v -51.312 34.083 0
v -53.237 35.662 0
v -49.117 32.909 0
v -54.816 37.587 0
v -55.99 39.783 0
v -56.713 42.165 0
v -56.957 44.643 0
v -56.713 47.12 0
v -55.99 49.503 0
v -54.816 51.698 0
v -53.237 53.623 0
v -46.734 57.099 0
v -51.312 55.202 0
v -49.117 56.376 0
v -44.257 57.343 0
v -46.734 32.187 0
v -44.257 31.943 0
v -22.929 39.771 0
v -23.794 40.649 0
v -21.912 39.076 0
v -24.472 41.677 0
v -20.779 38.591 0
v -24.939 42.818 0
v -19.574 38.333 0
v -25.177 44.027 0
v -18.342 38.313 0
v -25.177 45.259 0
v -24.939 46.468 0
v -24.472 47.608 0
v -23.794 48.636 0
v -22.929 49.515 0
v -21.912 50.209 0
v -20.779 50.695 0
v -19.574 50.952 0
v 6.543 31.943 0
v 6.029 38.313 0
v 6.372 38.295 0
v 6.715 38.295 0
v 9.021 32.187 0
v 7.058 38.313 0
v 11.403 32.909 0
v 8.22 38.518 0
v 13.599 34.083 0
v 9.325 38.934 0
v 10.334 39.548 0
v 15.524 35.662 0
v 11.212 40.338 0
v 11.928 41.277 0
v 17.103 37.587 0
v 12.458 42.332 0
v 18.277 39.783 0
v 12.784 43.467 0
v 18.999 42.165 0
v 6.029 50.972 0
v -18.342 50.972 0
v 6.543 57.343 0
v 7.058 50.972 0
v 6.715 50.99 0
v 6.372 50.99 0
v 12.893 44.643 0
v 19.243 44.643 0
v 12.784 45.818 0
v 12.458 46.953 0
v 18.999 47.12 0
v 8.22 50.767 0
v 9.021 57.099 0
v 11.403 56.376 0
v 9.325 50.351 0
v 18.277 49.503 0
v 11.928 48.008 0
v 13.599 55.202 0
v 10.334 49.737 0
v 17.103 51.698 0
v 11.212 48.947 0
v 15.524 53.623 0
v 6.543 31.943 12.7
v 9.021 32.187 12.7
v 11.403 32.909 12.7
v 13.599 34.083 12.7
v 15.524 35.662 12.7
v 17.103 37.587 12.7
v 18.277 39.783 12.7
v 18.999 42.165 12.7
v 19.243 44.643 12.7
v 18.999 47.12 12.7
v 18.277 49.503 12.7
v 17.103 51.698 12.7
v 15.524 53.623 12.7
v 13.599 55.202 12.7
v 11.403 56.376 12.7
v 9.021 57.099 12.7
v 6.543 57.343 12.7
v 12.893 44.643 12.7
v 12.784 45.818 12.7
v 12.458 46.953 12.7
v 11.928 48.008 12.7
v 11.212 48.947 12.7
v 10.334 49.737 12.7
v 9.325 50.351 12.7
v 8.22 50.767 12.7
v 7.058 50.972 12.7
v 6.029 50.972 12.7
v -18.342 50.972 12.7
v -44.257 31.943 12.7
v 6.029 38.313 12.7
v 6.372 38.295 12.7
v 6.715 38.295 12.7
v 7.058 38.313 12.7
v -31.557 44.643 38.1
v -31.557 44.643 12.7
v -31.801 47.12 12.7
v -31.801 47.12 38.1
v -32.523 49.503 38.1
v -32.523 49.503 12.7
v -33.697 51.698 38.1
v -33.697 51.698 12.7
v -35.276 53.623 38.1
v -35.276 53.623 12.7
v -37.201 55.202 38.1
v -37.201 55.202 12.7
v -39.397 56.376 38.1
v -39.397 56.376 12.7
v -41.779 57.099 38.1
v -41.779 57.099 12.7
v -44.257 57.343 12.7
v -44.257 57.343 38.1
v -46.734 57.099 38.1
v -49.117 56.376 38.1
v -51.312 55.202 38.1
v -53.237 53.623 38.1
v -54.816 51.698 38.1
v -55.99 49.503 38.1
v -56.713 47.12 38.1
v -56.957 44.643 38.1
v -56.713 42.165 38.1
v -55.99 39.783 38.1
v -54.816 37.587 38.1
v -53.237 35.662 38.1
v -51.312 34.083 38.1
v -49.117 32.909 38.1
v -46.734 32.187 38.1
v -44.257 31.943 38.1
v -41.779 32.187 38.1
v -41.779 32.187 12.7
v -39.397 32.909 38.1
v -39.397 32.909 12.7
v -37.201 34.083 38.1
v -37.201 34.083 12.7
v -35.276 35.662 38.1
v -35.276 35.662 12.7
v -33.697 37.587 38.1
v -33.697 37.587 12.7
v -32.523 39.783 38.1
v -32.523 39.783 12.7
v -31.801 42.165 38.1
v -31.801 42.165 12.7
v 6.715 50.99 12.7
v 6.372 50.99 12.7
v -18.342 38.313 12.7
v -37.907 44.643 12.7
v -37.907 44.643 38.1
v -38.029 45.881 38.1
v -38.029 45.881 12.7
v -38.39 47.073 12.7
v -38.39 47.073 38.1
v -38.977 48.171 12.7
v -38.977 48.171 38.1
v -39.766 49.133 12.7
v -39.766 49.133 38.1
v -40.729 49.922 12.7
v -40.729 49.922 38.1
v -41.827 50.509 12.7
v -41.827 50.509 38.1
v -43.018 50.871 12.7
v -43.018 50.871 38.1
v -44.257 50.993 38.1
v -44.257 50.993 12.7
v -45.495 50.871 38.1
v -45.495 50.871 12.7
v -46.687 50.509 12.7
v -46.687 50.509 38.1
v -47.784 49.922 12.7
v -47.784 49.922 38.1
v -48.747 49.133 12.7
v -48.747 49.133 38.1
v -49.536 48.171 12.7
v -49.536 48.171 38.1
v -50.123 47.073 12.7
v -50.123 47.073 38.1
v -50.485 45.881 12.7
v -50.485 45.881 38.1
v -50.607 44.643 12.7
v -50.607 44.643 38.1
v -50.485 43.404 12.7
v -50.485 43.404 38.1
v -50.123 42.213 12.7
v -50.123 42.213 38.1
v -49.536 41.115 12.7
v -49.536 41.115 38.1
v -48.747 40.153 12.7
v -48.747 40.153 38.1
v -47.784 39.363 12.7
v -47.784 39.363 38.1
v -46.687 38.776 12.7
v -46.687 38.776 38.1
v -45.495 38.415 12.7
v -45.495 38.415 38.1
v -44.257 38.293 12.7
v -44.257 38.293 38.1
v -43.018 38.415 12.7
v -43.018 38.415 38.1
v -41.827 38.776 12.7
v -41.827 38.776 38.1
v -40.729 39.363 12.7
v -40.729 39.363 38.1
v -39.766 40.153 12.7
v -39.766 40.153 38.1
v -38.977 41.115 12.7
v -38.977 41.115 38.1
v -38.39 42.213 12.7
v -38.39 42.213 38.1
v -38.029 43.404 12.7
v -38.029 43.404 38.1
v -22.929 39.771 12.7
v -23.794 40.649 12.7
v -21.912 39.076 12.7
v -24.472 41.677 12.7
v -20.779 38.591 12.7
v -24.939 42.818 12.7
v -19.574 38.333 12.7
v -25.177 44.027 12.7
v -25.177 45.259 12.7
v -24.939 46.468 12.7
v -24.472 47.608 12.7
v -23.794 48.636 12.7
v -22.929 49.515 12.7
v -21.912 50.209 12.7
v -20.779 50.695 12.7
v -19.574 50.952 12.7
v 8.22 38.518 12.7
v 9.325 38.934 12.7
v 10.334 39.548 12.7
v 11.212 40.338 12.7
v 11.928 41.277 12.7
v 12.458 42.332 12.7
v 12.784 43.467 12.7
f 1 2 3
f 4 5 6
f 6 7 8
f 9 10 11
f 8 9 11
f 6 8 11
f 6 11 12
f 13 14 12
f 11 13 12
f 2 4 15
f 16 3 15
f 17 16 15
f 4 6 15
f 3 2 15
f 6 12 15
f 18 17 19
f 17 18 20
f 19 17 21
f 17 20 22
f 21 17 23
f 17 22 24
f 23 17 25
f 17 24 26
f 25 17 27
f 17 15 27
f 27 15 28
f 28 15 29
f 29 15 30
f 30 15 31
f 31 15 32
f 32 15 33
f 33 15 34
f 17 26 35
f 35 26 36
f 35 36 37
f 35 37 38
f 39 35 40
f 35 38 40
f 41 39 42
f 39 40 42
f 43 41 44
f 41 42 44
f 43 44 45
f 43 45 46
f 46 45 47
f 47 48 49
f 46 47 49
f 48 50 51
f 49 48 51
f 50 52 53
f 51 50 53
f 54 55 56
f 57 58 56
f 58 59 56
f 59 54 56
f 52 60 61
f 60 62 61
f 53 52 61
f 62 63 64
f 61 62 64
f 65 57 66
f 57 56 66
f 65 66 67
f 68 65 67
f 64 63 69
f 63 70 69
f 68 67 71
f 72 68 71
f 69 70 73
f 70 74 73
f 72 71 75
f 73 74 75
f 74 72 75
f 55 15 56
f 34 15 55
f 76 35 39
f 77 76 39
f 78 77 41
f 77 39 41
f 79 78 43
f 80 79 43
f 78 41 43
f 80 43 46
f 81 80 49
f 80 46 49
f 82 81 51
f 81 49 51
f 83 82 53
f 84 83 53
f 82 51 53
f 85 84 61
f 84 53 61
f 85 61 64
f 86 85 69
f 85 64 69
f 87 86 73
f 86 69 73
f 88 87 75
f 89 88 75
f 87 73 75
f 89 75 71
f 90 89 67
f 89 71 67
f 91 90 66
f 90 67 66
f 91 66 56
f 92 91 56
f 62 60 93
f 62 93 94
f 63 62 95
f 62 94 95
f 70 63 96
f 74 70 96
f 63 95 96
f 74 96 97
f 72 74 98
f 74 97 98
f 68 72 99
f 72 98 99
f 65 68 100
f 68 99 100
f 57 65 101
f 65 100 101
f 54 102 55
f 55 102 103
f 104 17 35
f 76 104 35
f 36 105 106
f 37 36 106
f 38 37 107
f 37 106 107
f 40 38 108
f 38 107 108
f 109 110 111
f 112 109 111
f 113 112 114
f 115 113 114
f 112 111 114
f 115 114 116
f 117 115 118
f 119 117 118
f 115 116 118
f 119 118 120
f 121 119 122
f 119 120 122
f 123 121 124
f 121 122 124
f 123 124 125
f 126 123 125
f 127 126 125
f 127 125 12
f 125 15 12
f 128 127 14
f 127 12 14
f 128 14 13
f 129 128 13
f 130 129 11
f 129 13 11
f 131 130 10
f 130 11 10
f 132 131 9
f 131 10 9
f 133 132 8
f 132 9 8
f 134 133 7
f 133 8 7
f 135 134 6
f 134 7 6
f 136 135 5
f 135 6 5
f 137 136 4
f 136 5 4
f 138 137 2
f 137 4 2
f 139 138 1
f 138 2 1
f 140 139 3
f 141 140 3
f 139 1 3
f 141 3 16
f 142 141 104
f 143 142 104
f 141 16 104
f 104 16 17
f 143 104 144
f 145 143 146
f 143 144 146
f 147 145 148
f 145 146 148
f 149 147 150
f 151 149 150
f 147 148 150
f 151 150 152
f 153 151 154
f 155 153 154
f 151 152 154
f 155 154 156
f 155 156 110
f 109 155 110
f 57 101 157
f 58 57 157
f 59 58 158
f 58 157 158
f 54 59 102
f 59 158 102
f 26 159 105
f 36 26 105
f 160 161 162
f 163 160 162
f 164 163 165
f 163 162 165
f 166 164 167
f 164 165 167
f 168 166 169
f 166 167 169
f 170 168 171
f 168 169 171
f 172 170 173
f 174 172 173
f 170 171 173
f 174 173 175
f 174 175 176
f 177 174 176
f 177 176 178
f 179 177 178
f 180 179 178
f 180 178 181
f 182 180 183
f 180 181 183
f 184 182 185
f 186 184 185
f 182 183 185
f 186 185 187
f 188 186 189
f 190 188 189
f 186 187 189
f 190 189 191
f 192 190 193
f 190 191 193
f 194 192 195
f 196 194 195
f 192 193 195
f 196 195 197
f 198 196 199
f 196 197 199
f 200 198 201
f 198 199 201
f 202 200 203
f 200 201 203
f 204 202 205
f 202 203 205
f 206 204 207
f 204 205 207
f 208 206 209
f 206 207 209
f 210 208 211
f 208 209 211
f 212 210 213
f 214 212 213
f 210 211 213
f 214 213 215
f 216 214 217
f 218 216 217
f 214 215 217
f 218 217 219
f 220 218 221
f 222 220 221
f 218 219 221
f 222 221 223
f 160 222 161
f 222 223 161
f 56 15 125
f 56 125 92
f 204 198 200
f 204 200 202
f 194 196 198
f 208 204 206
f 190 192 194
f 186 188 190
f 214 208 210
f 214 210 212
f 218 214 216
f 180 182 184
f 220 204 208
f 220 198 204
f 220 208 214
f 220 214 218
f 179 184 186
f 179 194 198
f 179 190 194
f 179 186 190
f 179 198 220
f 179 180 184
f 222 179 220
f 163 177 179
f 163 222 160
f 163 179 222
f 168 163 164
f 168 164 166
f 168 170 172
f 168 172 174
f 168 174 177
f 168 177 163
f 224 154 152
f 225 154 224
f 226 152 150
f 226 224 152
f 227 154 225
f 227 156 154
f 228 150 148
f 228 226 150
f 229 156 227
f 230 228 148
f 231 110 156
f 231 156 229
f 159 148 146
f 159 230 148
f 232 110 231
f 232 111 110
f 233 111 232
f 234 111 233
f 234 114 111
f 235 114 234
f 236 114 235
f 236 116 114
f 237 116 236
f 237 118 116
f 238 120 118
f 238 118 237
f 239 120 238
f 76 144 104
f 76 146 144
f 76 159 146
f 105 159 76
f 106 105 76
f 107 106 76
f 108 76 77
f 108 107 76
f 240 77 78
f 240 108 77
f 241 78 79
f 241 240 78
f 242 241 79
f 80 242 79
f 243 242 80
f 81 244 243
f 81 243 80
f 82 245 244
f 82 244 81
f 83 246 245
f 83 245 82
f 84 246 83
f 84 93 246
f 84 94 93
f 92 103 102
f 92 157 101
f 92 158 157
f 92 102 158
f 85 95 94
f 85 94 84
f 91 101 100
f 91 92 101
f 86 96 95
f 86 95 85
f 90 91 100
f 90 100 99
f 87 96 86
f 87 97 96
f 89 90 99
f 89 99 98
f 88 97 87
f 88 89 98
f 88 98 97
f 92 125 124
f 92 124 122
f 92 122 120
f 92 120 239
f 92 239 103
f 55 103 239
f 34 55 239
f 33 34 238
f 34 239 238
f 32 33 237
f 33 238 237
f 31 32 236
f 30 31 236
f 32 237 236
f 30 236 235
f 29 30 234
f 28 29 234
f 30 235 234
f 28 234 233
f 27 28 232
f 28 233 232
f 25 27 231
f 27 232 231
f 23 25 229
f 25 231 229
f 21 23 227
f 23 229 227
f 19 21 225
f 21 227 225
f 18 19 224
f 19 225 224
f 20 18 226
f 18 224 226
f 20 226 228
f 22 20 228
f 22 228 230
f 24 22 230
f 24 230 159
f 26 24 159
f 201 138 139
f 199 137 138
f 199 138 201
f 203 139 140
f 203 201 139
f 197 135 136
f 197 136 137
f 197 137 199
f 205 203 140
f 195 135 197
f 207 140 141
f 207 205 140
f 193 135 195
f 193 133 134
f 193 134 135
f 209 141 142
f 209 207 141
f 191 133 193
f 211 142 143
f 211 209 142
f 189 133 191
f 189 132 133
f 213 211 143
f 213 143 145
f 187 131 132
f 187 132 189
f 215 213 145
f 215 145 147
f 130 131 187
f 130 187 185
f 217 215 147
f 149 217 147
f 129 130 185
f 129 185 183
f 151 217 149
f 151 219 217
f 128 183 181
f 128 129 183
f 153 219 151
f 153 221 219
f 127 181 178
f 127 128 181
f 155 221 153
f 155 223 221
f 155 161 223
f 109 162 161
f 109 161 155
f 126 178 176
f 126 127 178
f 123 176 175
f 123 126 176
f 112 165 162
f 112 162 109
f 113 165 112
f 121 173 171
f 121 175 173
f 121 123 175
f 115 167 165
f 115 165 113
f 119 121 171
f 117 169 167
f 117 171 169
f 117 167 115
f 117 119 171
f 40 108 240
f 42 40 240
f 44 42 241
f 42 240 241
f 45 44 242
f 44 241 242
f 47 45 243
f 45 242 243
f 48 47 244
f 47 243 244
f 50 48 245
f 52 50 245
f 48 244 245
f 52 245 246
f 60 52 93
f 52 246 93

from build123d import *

# Parameters (mm, degrees)
F0_W     = 50.8
F0_H     = 25.4
F1_DEPTH = 12.7
F2_R     = 12.7
F3_DEPTH = 25.4
F4_R     = 6.35
F5_DEPTH = 25.4
F7_DEPTH = 12.7


with BuildPart() as f1:
    # F0 (on Top) → F1 (new body)
    with BuildSketch(Plane.XY):
        with Locations((-18.8566240436, 44.6426421404)):
            Rectangle(F0_W, F0_H)
        with BuildLine():
            Line((-44.2566240436, 31.9426421404), (-44.2566240436, 57.3426421404))
            ThreePointArc((-44.2566240436, 57.3426421404), (-56.9566240436, 44.6426421404), (-44.2566240436, 31.9426421404))
        make_face()
        with BuildLine():
            ThreePointArc((6.5433759564, 31.9426421404), (19.2433759564, 44.6426421404), (6.5433759564, 57.3426421404))
            Line((6.5433759564, 57.3426421404), (6.5433759564, 31.9426421404))
        make_face()
    extrude(amount=F1_DEPTH)

    # F2 (on face) → F3 (join)
    with BuildSketch(Plane.XY.offset(12.7)):
        with Locations((-44.2566240436, 44.6426421404)):
            Circle(F2_R)
    extrude(amount=F3_DEPTH)

    # F4 (on face) → F5 (cut)
    with BuildSketch(Plane.XY.offset(38.1)):
        with Locations((-44.2566240436, 44.6426421404)):
            Circle(F4_R)
    extrude(amount=-F5_DEPTH, mode=Mode.SUBTRACT)

    # F6 (on face) → F7 (cut)
    with BuildSketch(Plane.XY.offset(12.7)):
        with BuildLine():
            ThreePointArc((7.0575587453, 38.3134940097), (11.2117568701, 40.3381422106), (12.8933759564, 44.6426421404))
            ThreePointArc((12.8933759564, 44.6426421404), (11.2117568701, 48.9471420701), (7.0575587453, 50.971790271))
            Line((7.0575587453, 50.971790271), (7.0575587453, 38.3134940097))
        make_face()
        with BuildLine():
            Line((6.0291931675, 50.971790271), (7.0575587453, 50.971790271))
            ThreePointArc((7.0575587453, 50.971790271), (6.5433759564, 50.9926421404), (6.0291931675, 50.971790271))
        make_face()
        with BuildLine():
            Line((7.0575587453, 38.3134940097), (7.0575587453, 50.971790271))
            Line((7.0575587453, 50.971790271), (6.0291931675, 50.971790271))
            ThreePointArc((6.0291931675, 50.971790271), (0.1933759564, 44.6426421404), (6.0291931675, 38.3134940097))
            Line((6.0291931675, 38.3134940097), (7.0575587453, 38.3134940097))
        make_face()
        with BuildLine():
            ThreePointArc((6.0291931675, 38.3134940097), (6.5433759564, 38.2926421404), (7.0575587453, 38.3134940097))
            Line((7.0575587453, 38.3134940097), (6.0291931675, 38.3134940097))
        make_face()
        with BuildLine():
            ThreePointArc((6.0291931675, 38.3134940097), (0.1933759564, 44.6426421404), (6.0291931675, 50.971790271))
            Line((6.0291931675, 50.971790271), (-18.3424412547, 50.971790271))
            ThreePointArc((-18.3424412547, 50.971790271), (-14.1882431299, 48.9471420701), (-12.5066240436, 44.6426421404))
            ThreePointArc((-12.5066240436, 44.6426421404), (-14.1882431299, 40.3381422106), (-18.3424412547, 38.3134940097))
            Line((-18.3424412547, 38.3134940097), (6.0291931675, 38.3134940097))
        make_face()
        with BuildLine():
            Line((-18.3424412547, 38.3134940097), (-18.3424412547, 50.971790271))
            ThreePointArc((-18.3424412547, 50.971790271), (-25.2066240436, 44.6426421404), (-18.3424412547, 38.3134940097))
        make_face()
        with BuildLine():
            ThreePointArc((-12.5066240436, 44.6426421404), (-14.1882431299, 48.9471420701), (-18.3424412547, 50.971790271))
            Line((-18.3424412547, 50.971790271), (-18.3424412547, 38.3134940097))
            ThreePointArc((-18.3424412547, 38.3134940097), (-14.1882431299, 40.3381422106), (-12.5066240436, 44.6426421404))
        make_face()
    extrude(amount=-F7_DEPTH, mode=Mode.SUBTRACT)


solid = f1.part
